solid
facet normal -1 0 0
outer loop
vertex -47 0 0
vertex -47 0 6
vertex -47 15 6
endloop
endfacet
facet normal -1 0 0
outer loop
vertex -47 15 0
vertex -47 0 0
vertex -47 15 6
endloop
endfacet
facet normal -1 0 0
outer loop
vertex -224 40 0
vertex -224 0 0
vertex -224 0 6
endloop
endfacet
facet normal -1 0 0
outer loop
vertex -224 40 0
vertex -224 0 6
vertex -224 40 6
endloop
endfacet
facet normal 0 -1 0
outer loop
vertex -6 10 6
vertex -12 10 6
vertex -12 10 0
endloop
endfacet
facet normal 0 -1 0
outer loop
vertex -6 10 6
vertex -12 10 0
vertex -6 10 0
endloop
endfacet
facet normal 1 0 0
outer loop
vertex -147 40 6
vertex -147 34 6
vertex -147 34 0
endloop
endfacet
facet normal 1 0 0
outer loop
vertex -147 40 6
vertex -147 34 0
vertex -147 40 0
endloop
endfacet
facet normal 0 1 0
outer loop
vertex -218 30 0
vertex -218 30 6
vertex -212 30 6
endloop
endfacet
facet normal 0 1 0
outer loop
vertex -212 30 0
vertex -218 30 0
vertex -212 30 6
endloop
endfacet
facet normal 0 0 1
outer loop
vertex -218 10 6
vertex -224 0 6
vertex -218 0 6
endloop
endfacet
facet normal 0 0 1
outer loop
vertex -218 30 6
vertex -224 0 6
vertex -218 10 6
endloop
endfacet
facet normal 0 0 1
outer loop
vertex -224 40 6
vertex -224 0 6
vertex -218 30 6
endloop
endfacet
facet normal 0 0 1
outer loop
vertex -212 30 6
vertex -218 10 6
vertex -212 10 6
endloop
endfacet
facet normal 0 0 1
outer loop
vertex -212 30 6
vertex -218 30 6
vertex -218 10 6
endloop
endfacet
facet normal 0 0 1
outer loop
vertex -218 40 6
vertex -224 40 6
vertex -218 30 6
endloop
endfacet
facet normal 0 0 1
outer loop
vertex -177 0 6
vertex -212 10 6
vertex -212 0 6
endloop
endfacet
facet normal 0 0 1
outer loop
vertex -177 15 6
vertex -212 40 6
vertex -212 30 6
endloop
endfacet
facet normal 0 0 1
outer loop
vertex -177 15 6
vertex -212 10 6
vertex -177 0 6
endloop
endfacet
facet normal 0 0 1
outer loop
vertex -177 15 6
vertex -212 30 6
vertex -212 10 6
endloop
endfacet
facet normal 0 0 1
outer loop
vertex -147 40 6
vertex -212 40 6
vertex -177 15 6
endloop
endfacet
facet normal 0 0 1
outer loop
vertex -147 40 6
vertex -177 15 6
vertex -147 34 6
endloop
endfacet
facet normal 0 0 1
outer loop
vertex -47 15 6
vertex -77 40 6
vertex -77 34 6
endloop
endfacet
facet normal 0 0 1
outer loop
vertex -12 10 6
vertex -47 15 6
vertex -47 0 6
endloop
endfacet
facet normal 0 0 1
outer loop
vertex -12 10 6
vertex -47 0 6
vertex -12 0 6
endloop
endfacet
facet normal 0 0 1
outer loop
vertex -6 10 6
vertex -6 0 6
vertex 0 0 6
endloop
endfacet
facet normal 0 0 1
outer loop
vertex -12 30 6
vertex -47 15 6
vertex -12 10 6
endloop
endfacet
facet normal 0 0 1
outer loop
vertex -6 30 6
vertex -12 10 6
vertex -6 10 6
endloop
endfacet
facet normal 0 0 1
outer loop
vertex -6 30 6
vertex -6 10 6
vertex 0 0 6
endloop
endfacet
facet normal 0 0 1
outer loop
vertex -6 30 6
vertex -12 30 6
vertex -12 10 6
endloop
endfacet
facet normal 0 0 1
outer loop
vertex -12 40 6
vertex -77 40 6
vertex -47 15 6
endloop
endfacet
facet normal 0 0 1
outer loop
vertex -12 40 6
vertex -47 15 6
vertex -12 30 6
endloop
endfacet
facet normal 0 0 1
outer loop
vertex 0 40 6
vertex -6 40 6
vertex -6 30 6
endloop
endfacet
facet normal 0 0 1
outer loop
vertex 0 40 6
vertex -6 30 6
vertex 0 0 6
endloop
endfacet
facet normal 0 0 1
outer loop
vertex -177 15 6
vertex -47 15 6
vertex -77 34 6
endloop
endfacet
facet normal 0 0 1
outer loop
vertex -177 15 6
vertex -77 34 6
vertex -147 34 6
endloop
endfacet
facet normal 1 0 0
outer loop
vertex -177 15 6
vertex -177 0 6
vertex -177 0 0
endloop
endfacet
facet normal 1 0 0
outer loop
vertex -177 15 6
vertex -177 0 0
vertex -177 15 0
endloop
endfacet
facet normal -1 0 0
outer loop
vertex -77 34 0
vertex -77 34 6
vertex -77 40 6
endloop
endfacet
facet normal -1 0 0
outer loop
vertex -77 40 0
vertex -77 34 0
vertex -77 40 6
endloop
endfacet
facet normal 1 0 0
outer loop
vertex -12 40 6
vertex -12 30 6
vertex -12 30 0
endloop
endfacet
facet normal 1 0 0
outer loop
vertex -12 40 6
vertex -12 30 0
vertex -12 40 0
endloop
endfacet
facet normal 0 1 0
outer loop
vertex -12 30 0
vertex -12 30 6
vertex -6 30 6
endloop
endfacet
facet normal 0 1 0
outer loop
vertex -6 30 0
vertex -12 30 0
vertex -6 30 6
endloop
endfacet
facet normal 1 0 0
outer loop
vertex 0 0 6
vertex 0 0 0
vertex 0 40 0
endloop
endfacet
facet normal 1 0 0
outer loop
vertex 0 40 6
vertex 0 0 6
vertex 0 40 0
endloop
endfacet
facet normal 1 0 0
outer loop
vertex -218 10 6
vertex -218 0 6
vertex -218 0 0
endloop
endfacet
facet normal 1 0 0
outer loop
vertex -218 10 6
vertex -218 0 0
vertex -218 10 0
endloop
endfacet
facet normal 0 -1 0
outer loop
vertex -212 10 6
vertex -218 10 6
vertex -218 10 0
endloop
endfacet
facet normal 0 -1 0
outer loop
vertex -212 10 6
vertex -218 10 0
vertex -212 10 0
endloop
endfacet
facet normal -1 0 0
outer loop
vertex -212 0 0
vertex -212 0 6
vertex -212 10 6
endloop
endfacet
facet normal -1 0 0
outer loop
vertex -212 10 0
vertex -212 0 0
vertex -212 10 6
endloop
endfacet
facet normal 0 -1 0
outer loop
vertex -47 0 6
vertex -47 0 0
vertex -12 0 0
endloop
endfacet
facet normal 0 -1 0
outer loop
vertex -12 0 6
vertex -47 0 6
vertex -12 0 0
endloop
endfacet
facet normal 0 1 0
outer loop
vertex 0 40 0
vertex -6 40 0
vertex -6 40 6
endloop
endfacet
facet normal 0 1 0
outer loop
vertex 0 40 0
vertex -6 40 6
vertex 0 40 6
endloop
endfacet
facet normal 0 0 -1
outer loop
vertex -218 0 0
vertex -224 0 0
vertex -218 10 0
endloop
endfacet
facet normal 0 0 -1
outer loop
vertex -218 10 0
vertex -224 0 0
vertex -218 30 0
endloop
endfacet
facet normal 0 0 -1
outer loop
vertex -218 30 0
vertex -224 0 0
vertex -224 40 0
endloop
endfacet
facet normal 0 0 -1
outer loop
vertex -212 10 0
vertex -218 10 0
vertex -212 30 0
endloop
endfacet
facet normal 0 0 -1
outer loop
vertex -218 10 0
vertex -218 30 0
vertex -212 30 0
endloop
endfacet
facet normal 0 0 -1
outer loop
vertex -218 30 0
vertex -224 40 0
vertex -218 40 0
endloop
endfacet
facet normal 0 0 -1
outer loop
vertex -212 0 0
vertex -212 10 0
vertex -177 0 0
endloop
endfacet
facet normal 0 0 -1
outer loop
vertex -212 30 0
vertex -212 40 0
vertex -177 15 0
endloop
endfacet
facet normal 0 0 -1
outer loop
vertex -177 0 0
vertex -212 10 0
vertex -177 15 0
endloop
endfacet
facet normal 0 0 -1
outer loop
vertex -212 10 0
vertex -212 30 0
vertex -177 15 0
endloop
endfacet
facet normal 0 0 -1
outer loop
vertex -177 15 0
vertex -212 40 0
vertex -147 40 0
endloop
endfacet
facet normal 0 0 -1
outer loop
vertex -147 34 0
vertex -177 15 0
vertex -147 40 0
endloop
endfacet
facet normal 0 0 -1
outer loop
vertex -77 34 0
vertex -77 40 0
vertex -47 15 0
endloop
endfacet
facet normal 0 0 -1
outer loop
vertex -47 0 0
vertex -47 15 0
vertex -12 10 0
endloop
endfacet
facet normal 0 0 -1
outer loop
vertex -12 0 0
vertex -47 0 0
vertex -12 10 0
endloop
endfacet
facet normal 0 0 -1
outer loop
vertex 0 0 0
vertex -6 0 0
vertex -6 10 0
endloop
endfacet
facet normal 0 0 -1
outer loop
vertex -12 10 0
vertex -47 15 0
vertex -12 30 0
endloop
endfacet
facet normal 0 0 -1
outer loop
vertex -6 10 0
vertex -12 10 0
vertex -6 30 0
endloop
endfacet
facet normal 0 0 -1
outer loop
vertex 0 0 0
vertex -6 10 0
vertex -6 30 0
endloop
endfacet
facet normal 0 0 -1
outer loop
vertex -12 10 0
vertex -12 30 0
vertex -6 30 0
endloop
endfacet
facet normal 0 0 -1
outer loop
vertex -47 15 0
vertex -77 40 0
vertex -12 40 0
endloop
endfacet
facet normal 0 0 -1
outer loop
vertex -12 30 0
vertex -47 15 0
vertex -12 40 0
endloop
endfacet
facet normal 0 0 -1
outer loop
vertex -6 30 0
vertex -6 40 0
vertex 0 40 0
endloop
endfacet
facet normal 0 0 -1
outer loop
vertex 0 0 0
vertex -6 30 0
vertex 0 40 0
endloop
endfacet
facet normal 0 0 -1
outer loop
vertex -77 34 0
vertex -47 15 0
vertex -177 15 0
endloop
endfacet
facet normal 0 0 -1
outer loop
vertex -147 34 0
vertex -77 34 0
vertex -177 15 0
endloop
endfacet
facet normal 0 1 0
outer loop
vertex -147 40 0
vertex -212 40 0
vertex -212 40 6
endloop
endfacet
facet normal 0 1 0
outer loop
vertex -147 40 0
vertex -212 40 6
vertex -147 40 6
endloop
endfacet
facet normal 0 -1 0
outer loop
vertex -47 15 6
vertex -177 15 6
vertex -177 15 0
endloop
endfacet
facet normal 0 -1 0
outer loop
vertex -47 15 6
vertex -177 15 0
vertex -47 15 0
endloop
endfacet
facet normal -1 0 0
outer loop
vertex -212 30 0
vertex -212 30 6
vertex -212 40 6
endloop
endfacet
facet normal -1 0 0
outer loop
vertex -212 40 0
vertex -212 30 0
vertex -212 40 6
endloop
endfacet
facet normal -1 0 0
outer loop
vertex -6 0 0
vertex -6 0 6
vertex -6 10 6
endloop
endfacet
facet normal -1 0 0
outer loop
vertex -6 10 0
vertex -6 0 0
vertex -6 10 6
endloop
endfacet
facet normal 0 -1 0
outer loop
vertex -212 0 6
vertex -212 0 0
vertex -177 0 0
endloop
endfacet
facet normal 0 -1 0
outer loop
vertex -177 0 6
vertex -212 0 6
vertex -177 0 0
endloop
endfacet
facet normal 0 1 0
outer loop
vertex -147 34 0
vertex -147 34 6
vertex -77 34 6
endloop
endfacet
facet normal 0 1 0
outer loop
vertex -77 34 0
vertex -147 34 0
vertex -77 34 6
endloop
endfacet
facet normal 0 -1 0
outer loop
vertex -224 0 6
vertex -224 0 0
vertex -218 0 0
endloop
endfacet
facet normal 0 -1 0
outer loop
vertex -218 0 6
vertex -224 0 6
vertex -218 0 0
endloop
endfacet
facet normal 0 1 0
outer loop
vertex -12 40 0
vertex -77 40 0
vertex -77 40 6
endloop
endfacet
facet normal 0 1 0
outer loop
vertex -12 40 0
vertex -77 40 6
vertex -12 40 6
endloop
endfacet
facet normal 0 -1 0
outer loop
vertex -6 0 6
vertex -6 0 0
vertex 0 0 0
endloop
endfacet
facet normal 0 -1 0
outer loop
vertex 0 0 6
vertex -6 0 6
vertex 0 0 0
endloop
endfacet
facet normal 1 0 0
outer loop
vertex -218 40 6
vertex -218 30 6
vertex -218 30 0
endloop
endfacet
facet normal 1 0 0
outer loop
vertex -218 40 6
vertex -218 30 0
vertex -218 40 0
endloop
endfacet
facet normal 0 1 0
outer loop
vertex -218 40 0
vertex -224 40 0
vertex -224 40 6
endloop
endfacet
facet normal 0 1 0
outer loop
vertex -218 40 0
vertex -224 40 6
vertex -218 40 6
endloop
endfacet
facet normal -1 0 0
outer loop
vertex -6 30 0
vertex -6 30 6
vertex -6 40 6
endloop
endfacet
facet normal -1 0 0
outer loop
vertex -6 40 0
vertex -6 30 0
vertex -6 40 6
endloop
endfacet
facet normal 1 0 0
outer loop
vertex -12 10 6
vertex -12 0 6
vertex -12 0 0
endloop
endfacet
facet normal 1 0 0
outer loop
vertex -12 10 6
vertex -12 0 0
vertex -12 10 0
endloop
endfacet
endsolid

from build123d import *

# Parameters (mm, degrees)
SKETCH1_W            = 224
SKETCH1_H            = 40
BOSS_EXTRUDE1_DEPTH  = 6
SKETCH2_W            = 6
SKETCH2_H            = 10
CUT_EXTRUDE1_DEPTH   = 228.622494495
LPATTERN1_COUNT      = 2
LPATTERN1_PITCH      = 206
LPATTERN1_COUNT_DIR2 = 2
LPATTERN1_PITCH_DIR2 = 30
SKETCH3_W            = 70
SKETCH3_H            = 6
CUT_EXTRUDE2_DEPTH   = 228.622494495
SKETCH4_W            = 130
SKETCH4_H            = 15
CUT_EXTRUDE3_DEPTH   = 10


with BuildPart() as part:
    # Sketch1 → Boss-Extrude1 (new body)
    with BuildSketch(Plane.XY):
        with Locations((-112, 20)):
            Rectangle(SKETCH1_W, SKETCH1_H)
    extrude(amount=BOSS_EXTRUDE1_DEPTH)

    # Sketch2 → Cut-Extrude1 (cut, through all)
    with BuildSketch(Plane.XY.offset(6)):
        with Locations((-215, 35)):
            Rectangle(SKETCH2_W, SKETCH2_H)
    cut_extrude1 = extrude(amount=-CUT_EXTRUDE1_DEPTH, mode=Mode.SUBTRACT)

    # LPattern1: Cut-Extrude1 2 × 2
    with Locations(*[(i * LPATTERN1_PITCH, -j * LPATTERN1_PITCH_DIR2, 0) for i in range(LPATTERN1_COUNT) for j in range(LPATTERN1_COUNT_DIR2) if (i, j) != (0, 0)]):
        add(cut_extrude1, mode=Mode.SUBTRACT)

    # Sketch3 → Cut-Extrude2 (cut, through all)
    with BuildSketch(Plane.XY.offset(6)):
        with Locations((-112, 37)):
            Rectangle(SKETCH3_W, SKETCH3_H)
    extrude(amount=-CUT_EXTRUDE2_DEPTH, mode=Mode.SUBTRACT)

    # Sketch4 → Cut-Extrude3 (cut)
    with BuildSketch(Plane.XY.offset(6)):
        with Locations((-112, 7.5)):
            Rectangle(SKETCH4_W, SKETCH4_H)
    extrude(amount=-CUT_EXTRUDE3_DEPTH, mode=Mode.SUBTRACT)


solid = part.part
